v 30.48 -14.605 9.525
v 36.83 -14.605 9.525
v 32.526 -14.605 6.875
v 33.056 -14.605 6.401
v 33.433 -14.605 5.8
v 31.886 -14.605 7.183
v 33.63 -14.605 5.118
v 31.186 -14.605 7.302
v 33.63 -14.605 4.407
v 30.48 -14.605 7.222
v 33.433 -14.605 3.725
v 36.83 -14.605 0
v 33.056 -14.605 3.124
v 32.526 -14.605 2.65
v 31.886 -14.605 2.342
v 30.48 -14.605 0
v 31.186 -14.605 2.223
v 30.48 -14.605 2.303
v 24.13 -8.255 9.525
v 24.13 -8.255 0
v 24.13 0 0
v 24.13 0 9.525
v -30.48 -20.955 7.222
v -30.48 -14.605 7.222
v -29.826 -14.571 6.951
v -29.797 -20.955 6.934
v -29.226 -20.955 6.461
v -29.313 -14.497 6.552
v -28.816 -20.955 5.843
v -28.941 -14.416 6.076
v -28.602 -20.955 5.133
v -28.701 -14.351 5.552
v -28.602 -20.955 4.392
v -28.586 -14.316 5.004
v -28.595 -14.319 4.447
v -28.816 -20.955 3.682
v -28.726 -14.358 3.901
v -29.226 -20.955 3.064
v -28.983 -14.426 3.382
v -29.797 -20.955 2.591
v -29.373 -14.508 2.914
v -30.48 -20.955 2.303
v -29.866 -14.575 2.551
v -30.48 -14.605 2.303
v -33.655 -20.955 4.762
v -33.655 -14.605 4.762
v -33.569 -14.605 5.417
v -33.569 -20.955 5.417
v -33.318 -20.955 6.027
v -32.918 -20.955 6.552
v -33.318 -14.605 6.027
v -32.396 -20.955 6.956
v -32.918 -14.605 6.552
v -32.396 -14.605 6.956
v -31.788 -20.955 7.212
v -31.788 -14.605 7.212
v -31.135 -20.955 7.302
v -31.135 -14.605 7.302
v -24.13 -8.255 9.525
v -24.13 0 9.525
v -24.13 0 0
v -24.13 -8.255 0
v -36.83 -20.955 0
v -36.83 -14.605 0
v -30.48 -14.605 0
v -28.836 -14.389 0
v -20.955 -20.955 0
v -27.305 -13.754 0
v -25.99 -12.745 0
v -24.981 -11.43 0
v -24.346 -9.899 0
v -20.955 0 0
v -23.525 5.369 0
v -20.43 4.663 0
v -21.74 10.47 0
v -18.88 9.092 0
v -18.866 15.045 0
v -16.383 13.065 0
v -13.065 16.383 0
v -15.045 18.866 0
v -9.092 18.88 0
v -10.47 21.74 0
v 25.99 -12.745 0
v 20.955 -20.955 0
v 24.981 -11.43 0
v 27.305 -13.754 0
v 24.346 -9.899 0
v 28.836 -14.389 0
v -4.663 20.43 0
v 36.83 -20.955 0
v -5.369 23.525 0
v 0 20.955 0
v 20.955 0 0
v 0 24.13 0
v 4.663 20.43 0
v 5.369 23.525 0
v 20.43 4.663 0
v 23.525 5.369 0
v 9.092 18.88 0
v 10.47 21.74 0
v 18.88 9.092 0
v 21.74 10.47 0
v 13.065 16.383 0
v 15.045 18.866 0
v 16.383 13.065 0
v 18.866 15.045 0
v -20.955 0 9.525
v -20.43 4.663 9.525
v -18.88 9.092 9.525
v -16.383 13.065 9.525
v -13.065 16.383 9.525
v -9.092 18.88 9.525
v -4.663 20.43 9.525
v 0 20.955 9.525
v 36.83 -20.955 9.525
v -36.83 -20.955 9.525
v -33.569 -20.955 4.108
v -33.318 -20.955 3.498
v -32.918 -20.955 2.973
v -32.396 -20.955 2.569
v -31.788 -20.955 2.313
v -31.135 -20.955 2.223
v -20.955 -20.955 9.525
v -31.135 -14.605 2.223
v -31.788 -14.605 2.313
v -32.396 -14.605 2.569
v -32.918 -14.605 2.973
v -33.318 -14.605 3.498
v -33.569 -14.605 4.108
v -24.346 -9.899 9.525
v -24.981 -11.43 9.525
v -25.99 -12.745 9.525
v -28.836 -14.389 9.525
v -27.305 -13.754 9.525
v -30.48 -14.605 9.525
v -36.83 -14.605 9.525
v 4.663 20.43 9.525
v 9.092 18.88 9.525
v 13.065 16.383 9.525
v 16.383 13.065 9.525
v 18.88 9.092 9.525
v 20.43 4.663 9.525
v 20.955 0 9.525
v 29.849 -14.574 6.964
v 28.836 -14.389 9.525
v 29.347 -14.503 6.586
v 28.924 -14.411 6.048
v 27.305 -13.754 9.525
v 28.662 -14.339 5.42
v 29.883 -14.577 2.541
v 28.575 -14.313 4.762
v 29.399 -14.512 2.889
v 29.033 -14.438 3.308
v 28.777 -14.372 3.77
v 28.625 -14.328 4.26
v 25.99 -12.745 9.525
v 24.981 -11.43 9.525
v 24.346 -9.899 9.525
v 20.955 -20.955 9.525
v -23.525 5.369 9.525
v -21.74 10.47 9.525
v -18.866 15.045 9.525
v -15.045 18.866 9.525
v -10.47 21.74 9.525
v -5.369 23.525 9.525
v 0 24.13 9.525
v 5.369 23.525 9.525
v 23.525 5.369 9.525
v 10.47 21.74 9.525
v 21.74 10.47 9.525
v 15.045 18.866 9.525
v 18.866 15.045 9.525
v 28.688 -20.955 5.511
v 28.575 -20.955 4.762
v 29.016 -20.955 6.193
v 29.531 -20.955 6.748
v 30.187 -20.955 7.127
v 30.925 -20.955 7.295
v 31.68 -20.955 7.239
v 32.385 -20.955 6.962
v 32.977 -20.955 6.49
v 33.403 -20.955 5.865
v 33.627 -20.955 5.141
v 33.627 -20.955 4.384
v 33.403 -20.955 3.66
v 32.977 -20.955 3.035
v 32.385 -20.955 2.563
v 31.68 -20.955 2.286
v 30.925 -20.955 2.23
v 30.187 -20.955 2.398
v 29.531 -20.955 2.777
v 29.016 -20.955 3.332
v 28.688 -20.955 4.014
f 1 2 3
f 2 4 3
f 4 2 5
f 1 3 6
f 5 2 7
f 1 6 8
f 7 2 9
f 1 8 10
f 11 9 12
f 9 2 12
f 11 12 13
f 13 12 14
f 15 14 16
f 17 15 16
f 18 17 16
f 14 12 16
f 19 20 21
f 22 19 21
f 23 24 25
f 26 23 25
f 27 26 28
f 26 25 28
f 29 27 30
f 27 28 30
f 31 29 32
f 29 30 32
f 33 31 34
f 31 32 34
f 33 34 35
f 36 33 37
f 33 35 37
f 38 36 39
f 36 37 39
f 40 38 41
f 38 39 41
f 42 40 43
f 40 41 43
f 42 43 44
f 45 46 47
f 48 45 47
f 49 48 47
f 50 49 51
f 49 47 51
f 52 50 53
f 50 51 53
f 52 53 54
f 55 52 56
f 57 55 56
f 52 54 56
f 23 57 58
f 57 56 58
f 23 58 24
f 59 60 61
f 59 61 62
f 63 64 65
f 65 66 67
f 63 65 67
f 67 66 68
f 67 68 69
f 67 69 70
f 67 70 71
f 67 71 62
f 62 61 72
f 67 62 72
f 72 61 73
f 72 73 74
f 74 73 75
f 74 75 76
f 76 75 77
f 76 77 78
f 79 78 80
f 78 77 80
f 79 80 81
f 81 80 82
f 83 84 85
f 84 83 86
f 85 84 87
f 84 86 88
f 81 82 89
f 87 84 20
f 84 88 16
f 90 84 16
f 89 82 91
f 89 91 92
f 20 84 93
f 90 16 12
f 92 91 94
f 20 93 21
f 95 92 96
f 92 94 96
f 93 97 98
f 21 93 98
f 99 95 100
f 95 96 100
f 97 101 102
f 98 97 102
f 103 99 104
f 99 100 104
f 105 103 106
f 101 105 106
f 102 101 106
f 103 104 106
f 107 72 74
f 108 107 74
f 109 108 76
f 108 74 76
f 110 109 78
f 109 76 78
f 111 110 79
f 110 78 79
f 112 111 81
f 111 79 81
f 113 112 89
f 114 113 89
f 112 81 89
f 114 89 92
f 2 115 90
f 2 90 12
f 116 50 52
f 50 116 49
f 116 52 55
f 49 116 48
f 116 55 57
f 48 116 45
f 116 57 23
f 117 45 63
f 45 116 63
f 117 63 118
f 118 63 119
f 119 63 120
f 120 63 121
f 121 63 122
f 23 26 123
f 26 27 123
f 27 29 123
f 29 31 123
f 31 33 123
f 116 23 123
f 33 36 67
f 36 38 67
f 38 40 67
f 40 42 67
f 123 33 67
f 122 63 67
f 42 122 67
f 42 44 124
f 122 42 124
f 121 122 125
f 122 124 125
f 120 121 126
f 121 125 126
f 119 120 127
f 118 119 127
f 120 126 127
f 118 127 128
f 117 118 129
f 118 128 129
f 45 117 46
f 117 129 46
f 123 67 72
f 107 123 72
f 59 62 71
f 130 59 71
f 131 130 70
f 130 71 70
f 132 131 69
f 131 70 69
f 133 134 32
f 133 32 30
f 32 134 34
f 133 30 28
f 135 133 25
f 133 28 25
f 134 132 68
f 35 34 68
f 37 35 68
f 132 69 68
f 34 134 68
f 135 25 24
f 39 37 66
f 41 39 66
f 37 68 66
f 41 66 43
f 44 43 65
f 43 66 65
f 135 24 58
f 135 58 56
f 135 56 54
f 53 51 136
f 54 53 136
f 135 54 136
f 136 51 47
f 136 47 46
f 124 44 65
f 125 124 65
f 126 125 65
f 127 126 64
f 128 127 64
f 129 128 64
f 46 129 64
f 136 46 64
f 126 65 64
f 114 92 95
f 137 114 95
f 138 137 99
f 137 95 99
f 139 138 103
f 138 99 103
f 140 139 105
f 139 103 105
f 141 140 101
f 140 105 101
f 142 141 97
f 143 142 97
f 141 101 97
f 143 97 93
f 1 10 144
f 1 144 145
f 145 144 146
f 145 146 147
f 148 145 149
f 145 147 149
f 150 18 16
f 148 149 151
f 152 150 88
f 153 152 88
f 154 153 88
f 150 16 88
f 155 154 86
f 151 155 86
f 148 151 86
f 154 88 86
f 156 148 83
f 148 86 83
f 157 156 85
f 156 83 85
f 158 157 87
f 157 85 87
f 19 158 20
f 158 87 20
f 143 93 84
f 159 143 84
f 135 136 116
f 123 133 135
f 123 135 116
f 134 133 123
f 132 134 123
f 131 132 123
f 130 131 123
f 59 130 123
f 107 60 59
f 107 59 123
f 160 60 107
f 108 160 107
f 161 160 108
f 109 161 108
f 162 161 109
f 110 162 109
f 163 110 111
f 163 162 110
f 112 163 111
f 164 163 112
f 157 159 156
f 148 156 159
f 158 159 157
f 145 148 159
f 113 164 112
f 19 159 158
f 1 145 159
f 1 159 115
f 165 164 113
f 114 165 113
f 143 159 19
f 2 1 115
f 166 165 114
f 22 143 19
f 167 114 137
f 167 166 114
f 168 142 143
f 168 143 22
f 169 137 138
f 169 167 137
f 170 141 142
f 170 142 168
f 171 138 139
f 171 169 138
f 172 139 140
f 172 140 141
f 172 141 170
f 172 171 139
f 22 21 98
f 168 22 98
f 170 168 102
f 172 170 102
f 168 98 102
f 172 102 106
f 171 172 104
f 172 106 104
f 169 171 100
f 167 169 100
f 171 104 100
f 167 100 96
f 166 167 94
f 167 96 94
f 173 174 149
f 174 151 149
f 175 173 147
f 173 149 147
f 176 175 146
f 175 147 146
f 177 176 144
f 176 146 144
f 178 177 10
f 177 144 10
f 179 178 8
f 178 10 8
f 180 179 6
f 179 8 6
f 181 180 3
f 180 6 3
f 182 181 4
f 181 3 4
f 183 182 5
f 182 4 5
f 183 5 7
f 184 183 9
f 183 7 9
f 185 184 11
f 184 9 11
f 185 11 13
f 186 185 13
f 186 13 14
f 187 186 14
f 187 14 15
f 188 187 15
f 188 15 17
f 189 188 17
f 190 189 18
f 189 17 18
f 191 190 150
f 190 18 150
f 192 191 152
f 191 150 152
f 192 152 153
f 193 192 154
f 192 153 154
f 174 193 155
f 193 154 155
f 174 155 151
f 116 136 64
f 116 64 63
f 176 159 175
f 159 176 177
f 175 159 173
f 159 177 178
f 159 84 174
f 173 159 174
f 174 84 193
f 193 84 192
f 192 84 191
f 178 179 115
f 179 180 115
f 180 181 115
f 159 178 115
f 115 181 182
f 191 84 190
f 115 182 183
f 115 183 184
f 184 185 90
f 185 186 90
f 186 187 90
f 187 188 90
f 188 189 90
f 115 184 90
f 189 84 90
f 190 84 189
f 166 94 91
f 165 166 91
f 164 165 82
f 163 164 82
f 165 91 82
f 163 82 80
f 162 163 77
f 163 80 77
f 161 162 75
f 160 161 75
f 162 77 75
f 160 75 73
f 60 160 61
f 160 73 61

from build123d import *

# Parameters (mm, degrees)
F1_DEPTH      = 9.525
F2_R          = 2.54
F3_DEPTH      = 25.4
F3_DEPTH_BACK = 25.4


with BuildPart() as f1:
    # F0 (on Top) → F1 (new body)
    with BuildSketch(Plane.XY):
        with BuildLine():
            ThreePointArc((-20.955, 0), (-14.8174225998, 14.8174225998), (0, 20.955))
            ThreePointArc((0, 20.955), (14.8174225998, 14.8174225998), (20.955, 0))
            Line((20.955, 0), (20.955, -20.955))
            Line((20.955, -20.955), (36.83, -20.955))
            Line((36.83, -20.955), (36.83, -14.605))
            Line((36.83, -14.605), (30.48, -14.605))
            ThreePointArc((30.48, -14.605), (25.9898719395, -12.7451280605), (24.13, -8.255))
            Line((24.13, -8.255), (24.13, 0))
            ThreePointArc((24.13, 0), (17.06248663, 17.06248663), (0, 24.13))
            ThreePointArc((0, 24.13), (-17.06248663, 17.06248663), (-24.13, 0))
            Line((-24.13, 0), (-24.13, -8.255))
            ThreePointArc((-24.13, -8.255), (-25.9898719395, -12.7451280605), (-30.48, -14.605))
            Line((-30.48, -14.605), (-36.83, -14.605))
            Line((-36.83, -14.605), (-36.83, -20.955))
            Line((-36.83, -20.955), (-20.955, -20.955))
            Line((-20.955, -20.955), (-20.955, 0))
        make_face()
    extrude(amount=F1_DEPTH)

    # F2 (on face) → F3 (cut, two sides)
    with BuildSketch(Plane(origin=(0, -14.605, 0), x_dir=(-1, 0, 0), z_dir=(0, 1, 0))) as f3_sk:
        with Locations((-31.115, 4.7625)):
            Circle(F2_R)
        with BuildLine():
            Line((30.48, 2.3031555752), (30.48, 7.2218444248))
            ThreePointArc((30.48, 7.2218444248), (28.575, 4.7625), (30.48, 2.3031555752))
        make_face()
        with BuildLine():
            ThreePointArc((30.48, 2.3031555752), (32.6704259867, 2.7544536858), (33.655, 4.7625))
            ThreePointArc((33.655, 4.7625), (32.6704259867, 6.7705463142), (30.48, 7.2218444248))
            Line((30.48, 7.2218444248), (30.48, 2.3031555752))
        make_face()
    extrude(amount=-F3_DEPTH, mode=Mode.SUBTRACT)
    extrude(f3_sk.sketch, amount=F3_DEPTH_BACK, mode=Mode.SUBTRACT)


solid = f1.part
